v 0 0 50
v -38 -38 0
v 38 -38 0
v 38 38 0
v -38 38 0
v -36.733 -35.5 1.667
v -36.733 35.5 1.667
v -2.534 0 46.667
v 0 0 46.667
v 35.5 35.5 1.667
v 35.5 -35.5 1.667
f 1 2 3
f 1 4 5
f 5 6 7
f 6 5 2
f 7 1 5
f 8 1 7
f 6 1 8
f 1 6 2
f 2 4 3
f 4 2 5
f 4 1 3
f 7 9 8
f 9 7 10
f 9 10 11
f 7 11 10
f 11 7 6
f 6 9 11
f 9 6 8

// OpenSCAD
module pyr(b, h) {
    w=sqrt(pow(b,2) * 2);
    rotate(45) cylinder(d1=w, d2=.001, h=h, $fn=4);
}

module cutout(b, h, t) {
    module m() {
        resize([b-t, b-t, h-t]) pyr(b, h);
    }
    hull() {
        translate([0, 0, t/3]) m();
        translate([-t, 0, t/3]) m();
    }
}

module hpyr(b, h) {
    difference() {
        pyr(b, h);
        cutout(b, h, 5);
    }
}

hpyr(76, 50);
